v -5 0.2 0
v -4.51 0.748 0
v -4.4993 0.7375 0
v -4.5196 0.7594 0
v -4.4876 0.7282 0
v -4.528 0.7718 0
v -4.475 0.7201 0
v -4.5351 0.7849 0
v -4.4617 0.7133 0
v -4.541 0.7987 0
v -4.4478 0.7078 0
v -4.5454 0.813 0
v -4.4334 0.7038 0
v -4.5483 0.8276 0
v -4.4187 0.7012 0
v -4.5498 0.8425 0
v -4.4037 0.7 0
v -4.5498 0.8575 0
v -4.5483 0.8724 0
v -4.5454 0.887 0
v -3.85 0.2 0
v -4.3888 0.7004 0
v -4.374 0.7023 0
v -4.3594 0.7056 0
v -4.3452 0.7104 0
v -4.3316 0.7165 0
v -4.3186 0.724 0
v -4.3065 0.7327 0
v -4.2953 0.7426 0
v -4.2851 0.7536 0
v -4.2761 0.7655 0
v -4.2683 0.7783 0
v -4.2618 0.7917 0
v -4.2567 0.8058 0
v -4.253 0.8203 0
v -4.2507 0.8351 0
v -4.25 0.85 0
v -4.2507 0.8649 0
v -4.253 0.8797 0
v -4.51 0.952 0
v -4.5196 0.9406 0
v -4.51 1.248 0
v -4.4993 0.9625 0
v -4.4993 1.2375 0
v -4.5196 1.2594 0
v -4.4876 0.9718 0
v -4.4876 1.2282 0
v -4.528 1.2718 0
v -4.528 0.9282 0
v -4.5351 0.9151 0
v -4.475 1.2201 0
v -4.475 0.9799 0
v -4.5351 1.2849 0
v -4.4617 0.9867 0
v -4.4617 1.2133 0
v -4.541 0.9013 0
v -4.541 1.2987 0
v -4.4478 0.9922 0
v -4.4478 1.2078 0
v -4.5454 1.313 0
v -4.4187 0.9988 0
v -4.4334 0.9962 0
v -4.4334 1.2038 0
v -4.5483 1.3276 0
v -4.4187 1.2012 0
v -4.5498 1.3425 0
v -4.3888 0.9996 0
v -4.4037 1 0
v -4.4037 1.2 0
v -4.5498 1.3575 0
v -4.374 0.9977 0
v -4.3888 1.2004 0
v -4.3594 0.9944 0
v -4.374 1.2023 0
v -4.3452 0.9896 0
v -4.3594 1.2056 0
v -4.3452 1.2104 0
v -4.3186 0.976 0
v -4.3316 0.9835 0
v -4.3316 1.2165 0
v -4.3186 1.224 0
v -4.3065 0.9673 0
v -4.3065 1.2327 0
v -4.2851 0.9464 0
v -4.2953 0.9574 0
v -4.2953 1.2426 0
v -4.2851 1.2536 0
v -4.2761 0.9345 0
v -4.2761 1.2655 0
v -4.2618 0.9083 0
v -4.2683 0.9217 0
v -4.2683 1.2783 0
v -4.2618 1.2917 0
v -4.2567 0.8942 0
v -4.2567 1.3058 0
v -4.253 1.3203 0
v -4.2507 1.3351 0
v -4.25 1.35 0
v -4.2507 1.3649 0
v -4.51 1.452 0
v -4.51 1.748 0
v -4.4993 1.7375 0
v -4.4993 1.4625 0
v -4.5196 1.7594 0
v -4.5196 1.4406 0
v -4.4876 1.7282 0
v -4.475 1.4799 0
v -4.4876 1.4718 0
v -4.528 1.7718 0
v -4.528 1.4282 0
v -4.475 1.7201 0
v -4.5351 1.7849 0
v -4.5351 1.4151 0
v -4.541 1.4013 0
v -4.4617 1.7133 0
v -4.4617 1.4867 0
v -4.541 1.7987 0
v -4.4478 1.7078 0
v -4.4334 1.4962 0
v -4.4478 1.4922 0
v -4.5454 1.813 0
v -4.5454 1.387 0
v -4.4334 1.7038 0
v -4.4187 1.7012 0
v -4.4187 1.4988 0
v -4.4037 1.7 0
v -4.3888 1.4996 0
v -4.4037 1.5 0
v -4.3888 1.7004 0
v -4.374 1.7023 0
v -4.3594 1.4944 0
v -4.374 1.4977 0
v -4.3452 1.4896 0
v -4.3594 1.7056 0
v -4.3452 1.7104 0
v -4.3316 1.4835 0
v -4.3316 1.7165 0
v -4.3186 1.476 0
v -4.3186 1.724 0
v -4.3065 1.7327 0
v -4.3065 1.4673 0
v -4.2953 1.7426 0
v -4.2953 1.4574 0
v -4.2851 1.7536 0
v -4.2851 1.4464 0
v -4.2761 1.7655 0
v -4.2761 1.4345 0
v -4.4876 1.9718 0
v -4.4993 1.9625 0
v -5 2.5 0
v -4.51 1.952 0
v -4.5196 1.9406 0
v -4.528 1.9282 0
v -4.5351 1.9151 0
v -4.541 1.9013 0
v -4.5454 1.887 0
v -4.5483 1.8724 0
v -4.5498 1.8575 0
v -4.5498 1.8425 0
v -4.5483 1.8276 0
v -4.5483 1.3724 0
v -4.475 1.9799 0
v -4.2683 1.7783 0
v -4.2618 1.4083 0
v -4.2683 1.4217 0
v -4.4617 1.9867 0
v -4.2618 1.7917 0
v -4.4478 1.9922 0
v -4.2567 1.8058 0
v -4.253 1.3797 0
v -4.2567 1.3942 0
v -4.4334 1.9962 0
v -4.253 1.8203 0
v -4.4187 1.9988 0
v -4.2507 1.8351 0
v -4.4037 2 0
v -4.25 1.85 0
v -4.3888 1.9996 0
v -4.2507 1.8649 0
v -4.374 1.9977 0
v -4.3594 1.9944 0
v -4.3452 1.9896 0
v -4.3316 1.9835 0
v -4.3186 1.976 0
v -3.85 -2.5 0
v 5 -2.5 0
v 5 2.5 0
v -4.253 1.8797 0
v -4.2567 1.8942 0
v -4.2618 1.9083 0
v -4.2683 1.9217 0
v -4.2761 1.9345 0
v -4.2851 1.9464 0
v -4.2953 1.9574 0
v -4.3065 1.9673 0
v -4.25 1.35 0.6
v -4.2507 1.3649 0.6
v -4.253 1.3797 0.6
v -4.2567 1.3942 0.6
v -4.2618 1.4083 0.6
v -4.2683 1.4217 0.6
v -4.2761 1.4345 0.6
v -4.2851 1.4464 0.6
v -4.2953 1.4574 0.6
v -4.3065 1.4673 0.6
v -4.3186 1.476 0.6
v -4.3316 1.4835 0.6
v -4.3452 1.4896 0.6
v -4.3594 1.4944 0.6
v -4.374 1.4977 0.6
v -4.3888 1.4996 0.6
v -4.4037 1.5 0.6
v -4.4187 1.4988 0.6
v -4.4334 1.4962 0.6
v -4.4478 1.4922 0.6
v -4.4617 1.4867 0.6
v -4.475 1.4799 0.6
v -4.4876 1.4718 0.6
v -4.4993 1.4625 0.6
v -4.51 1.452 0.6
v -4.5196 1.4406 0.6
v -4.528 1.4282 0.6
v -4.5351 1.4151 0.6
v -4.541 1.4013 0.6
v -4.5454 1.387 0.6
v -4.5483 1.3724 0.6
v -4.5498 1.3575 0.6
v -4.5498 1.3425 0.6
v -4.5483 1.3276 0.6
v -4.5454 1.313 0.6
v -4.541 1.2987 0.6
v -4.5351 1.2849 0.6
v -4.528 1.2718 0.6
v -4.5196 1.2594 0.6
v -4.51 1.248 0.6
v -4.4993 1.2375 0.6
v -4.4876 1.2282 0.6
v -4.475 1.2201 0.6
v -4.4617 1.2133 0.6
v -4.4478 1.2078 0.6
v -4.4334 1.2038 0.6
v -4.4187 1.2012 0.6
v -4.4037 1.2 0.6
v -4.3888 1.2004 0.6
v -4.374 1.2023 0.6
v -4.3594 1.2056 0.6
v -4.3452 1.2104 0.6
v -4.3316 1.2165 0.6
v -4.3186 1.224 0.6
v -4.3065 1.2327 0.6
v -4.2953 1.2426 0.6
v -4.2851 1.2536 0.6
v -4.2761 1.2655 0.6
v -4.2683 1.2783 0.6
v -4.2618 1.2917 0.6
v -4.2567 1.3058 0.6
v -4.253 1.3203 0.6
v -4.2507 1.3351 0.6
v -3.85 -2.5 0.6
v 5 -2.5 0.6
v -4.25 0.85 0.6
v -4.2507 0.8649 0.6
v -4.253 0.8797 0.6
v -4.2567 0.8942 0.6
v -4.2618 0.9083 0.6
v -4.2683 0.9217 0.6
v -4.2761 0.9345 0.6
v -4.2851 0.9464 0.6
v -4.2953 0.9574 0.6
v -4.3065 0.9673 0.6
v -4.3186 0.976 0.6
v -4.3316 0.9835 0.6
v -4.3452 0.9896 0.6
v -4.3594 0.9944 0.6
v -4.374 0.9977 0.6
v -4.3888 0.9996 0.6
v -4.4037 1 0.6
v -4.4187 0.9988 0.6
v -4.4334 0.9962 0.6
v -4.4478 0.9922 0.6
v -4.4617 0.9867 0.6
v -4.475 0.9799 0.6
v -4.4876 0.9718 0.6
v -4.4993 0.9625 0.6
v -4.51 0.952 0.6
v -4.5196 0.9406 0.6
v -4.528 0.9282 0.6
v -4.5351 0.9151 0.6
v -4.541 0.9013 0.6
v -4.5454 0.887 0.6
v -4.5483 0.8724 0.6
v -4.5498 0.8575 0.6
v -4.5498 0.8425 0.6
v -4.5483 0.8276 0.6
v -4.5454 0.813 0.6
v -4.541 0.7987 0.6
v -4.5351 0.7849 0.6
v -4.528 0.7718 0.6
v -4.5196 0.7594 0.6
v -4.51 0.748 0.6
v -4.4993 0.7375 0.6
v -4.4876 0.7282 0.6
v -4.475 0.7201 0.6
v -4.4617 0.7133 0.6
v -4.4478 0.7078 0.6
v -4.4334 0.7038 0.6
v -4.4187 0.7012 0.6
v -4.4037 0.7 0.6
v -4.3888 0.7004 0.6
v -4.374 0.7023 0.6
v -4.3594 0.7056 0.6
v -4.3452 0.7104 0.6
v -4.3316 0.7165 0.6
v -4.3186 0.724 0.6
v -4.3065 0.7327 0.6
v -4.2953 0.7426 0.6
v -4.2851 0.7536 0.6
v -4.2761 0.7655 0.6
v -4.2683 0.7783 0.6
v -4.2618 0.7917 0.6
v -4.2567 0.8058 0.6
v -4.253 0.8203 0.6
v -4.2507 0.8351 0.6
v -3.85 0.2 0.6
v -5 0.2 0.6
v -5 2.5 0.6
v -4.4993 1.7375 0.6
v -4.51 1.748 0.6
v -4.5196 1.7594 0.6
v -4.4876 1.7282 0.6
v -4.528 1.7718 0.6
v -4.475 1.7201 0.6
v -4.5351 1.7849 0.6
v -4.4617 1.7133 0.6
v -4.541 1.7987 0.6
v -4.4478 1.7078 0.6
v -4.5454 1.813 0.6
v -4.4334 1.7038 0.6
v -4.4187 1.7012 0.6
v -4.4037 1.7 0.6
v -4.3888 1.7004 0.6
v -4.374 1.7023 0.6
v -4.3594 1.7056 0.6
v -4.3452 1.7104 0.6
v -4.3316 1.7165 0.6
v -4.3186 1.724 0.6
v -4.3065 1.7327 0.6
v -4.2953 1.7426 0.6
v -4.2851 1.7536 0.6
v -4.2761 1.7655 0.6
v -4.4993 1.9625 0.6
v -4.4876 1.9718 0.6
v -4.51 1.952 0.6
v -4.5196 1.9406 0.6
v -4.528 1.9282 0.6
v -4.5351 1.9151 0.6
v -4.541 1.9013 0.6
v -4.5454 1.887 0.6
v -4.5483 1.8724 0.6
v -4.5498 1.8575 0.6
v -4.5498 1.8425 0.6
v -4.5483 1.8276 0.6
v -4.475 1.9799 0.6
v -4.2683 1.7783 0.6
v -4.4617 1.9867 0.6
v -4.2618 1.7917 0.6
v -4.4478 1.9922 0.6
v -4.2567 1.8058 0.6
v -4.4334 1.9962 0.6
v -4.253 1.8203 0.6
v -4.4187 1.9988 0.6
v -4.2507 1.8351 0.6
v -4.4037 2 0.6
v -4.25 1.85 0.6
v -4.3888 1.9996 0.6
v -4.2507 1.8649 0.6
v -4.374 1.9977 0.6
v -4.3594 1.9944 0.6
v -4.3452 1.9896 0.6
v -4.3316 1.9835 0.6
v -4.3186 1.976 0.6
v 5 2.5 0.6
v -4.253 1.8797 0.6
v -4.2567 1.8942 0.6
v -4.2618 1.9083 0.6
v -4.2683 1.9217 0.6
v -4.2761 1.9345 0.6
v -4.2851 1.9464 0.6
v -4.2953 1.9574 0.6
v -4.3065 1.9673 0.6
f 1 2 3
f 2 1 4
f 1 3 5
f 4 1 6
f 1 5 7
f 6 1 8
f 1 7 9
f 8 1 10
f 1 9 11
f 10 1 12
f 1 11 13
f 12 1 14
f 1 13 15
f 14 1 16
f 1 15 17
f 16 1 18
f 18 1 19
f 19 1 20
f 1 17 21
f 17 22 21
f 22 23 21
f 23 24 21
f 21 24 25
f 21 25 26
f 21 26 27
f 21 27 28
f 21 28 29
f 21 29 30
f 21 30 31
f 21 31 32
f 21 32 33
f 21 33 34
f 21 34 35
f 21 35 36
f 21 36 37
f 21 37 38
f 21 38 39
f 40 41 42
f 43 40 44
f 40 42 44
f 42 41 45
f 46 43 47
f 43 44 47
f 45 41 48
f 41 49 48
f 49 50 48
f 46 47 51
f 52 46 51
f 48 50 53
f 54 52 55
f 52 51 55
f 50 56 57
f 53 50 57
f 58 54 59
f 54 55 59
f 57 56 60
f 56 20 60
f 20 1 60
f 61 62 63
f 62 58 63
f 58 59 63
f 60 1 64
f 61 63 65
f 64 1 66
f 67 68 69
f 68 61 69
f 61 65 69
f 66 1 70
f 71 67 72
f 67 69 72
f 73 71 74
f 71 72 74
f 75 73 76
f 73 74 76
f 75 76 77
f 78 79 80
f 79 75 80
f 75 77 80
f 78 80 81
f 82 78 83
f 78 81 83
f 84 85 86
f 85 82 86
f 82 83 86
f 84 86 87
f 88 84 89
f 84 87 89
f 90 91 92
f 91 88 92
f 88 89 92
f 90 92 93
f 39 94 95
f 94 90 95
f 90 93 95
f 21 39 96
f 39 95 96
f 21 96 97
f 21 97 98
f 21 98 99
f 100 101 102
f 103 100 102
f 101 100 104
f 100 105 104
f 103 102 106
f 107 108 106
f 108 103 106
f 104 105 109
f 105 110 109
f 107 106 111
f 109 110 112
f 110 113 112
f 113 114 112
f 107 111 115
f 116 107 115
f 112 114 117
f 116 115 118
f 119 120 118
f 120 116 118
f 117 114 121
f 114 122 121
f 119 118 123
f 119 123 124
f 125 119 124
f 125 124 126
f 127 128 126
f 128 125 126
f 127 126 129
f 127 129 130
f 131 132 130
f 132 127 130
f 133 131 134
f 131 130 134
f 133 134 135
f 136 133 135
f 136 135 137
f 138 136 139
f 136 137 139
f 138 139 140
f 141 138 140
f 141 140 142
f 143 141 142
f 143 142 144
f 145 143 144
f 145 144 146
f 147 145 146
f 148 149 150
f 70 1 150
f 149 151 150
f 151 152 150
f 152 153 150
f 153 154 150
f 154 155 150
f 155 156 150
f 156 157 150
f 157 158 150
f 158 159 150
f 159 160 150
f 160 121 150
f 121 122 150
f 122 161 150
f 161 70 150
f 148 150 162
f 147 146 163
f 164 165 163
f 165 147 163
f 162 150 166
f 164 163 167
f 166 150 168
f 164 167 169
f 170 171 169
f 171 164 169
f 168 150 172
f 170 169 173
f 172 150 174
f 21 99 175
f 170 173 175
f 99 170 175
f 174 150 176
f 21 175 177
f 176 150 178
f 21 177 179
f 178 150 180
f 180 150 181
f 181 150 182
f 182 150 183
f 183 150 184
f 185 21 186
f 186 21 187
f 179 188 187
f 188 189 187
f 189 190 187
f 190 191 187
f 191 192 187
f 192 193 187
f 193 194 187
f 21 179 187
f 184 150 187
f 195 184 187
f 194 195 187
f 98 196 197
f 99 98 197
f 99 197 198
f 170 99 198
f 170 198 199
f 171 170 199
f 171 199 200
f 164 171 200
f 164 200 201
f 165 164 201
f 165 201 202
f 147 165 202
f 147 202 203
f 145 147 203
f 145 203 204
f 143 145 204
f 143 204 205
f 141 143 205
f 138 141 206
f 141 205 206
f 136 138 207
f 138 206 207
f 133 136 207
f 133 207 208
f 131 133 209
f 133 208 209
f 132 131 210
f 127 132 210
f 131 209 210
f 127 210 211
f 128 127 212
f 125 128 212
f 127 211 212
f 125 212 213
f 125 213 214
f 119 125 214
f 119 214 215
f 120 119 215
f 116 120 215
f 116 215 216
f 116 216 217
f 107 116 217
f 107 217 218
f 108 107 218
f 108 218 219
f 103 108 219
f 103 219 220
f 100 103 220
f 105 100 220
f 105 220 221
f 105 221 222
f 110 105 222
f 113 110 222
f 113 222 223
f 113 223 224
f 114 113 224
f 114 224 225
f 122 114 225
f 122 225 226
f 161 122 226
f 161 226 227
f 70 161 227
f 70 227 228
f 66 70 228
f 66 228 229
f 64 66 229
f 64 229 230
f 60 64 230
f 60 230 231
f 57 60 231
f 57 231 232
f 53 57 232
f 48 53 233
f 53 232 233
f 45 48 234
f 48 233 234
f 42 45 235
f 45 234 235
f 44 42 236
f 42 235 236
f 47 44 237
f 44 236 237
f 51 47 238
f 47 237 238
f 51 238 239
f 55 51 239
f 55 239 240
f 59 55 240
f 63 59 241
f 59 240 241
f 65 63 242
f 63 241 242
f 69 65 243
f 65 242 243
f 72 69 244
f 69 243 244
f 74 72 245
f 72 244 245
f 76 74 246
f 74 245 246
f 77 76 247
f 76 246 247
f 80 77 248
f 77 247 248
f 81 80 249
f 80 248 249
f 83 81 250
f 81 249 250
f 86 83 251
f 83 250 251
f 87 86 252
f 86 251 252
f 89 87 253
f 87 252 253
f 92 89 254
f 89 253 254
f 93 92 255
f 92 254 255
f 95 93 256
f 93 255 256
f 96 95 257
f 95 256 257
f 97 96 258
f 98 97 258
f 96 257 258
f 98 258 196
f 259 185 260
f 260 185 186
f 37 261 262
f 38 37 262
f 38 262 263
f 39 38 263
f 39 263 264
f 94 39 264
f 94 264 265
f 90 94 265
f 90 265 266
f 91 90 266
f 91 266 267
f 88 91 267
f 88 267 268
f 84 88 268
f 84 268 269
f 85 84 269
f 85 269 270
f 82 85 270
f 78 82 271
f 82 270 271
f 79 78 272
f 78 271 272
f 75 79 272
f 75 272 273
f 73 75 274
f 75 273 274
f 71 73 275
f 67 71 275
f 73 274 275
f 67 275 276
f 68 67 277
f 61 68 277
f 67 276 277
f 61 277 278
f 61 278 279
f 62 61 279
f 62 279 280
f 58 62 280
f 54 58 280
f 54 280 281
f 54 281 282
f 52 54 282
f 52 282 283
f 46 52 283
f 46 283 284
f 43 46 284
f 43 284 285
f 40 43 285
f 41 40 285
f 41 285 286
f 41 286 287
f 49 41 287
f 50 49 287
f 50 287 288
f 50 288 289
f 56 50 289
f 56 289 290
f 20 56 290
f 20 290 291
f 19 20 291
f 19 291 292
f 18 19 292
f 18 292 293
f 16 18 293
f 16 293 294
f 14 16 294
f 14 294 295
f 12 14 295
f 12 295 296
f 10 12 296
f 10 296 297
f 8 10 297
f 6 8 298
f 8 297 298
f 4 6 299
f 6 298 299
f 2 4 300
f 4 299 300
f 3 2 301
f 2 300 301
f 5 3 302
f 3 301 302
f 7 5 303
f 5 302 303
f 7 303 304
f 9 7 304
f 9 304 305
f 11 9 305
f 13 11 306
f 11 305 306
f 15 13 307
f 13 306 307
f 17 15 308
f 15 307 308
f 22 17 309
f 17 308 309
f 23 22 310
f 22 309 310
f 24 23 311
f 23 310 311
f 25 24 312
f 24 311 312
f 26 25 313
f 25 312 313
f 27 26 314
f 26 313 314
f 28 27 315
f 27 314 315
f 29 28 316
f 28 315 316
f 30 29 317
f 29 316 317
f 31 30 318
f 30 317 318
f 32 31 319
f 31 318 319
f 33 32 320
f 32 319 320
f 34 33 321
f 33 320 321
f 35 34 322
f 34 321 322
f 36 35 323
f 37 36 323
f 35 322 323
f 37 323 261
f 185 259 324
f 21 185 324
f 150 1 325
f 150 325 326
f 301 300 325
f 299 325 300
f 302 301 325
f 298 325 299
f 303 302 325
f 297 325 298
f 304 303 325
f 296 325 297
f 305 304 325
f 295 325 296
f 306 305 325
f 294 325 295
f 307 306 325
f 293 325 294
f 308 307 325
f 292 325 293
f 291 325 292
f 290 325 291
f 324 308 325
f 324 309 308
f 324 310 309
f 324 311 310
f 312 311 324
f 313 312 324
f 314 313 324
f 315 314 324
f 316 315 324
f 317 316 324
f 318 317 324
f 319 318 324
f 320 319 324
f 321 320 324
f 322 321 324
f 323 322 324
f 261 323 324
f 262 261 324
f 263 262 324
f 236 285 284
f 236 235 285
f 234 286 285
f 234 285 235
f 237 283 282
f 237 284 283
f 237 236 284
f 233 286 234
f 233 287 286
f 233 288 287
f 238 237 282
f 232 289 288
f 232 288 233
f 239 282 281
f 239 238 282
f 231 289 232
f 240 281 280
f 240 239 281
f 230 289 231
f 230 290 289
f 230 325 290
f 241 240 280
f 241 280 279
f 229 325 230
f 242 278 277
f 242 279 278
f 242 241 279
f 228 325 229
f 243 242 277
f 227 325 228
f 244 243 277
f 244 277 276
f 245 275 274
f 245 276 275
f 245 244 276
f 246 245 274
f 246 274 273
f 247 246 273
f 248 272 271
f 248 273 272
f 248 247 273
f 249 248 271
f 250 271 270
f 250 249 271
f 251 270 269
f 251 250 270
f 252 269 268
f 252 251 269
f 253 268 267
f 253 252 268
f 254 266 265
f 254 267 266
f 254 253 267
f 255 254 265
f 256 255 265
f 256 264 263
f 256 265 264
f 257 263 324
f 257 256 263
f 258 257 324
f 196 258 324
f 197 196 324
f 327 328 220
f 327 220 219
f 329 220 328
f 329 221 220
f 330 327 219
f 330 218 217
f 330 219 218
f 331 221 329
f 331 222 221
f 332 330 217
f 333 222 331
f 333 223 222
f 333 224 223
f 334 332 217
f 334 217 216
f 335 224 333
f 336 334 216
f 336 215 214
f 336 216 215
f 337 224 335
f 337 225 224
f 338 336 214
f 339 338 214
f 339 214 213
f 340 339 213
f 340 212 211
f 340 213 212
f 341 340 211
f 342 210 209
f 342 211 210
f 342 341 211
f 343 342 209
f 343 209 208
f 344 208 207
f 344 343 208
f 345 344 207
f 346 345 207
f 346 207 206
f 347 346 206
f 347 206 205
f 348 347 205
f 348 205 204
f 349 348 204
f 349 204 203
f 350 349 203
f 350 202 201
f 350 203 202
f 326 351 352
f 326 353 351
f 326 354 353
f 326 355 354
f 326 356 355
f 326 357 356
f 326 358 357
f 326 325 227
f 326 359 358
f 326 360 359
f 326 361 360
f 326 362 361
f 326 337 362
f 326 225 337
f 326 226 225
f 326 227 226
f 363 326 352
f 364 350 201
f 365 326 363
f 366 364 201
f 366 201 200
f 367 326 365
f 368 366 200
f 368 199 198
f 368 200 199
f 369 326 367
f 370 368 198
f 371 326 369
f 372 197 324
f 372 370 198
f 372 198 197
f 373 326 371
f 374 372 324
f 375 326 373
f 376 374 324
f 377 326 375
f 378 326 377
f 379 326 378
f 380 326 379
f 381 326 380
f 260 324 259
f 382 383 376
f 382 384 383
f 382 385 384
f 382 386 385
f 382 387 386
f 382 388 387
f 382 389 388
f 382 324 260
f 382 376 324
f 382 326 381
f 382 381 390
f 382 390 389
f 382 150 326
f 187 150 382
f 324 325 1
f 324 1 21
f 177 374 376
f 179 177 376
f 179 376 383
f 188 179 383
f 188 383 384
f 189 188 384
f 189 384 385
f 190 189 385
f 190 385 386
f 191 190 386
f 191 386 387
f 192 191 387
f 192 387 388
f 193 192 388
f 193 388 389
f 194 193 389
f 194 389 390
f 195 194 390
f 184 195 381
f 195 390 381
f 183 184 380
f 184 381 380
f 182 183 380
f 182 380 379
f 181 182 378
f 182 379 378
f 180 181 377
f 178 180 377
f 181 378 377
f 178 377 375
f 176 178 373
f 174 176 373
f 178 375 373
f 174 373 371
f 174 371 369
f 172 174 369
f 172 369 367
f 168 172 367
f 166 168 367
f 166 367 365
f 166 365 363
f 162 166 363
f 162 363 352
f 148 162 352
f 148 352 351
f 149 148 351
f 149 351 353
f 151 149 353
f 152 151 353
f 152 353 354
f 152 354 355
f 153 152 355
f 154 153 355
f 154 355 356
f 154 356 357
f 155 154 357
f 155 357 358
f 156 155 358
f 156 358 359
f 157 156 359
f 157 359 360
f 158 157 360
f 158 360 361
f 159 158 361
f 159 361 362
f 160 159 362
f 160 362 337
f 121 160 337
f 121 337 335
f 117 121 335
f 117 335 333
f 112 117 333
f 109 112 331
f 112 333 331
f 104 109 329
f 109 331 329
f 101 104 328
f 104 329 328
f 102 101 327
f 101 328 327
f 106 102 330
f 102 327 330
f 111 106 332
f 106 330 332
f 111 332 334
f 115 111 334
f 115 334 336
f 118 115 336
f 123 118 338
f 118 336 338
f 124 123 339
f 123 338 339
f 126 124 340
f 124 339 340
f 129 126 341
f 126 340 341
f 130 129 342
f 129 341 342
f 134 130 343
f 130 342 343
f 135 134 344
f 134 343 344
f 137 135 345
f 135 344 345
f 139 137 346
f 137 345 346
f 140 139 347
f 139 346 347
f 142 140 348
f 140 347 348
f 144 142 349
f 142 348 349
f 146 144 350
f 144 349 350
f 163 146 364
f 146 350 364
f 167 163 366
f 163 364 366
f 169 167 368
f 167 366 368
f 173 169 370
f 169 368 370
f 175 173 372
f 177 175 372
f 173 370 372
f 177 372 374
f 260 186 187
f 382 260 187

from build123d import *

# Parameters (mm, degrees)
SKETCH1_W           = 10
SKETCH1_H           = 5
BOSS_EXTRUDE1_DEPTH = 0.6
SKETCH2_W           = 1.15
SKETCH2_H           = 2.7
CUT_EXTRUDE1_DEPTH  = 6.622277119
SKETCH3_R           = 0.15
CUT_EXTRUDE2_DEPTH  = 6.622277119


with BuildPart() as part:
    # Sketch1 → Boss-Extrude1 (new body)
    with BuildSketch(Plane.XY):
        Rectangle(SKETCH1_W, SKETCH1_H)
    extrude(amount=BOSS_EXTRUDE1_DEPTH)

    # Sketch2 → Cut-Extrude1 (cut, through all)
    with BuildSketch(Plane.XY.offset(0.6)):
        with Locations((-4.425, -1.15)):
            Rectangle(SKETCH2_W, SKETCH2_H)
    extrude(amount=-CUT_EXTRUDE1_DEPTH, mode=Mode.SUBTRACT)

    # Sketch3 → Cut-Extrude2 (cut, through all)
    with BuildSketch(Plane.XY.offset(0.6)):
        with Locations((-4.4, 1.85)):
            Circle(SKETCH3_R)
        with Locations((-4.4, 1.35)):
            Circle(SKETCH3_R)
        with Locations((-4.4, 0.85)):
            Circle(SKETCH3_R)
    extrude(amount=-CUT_EXTRUDE2_DEPTH, mode=Mode.SUBTRACT)


solid = part.part
